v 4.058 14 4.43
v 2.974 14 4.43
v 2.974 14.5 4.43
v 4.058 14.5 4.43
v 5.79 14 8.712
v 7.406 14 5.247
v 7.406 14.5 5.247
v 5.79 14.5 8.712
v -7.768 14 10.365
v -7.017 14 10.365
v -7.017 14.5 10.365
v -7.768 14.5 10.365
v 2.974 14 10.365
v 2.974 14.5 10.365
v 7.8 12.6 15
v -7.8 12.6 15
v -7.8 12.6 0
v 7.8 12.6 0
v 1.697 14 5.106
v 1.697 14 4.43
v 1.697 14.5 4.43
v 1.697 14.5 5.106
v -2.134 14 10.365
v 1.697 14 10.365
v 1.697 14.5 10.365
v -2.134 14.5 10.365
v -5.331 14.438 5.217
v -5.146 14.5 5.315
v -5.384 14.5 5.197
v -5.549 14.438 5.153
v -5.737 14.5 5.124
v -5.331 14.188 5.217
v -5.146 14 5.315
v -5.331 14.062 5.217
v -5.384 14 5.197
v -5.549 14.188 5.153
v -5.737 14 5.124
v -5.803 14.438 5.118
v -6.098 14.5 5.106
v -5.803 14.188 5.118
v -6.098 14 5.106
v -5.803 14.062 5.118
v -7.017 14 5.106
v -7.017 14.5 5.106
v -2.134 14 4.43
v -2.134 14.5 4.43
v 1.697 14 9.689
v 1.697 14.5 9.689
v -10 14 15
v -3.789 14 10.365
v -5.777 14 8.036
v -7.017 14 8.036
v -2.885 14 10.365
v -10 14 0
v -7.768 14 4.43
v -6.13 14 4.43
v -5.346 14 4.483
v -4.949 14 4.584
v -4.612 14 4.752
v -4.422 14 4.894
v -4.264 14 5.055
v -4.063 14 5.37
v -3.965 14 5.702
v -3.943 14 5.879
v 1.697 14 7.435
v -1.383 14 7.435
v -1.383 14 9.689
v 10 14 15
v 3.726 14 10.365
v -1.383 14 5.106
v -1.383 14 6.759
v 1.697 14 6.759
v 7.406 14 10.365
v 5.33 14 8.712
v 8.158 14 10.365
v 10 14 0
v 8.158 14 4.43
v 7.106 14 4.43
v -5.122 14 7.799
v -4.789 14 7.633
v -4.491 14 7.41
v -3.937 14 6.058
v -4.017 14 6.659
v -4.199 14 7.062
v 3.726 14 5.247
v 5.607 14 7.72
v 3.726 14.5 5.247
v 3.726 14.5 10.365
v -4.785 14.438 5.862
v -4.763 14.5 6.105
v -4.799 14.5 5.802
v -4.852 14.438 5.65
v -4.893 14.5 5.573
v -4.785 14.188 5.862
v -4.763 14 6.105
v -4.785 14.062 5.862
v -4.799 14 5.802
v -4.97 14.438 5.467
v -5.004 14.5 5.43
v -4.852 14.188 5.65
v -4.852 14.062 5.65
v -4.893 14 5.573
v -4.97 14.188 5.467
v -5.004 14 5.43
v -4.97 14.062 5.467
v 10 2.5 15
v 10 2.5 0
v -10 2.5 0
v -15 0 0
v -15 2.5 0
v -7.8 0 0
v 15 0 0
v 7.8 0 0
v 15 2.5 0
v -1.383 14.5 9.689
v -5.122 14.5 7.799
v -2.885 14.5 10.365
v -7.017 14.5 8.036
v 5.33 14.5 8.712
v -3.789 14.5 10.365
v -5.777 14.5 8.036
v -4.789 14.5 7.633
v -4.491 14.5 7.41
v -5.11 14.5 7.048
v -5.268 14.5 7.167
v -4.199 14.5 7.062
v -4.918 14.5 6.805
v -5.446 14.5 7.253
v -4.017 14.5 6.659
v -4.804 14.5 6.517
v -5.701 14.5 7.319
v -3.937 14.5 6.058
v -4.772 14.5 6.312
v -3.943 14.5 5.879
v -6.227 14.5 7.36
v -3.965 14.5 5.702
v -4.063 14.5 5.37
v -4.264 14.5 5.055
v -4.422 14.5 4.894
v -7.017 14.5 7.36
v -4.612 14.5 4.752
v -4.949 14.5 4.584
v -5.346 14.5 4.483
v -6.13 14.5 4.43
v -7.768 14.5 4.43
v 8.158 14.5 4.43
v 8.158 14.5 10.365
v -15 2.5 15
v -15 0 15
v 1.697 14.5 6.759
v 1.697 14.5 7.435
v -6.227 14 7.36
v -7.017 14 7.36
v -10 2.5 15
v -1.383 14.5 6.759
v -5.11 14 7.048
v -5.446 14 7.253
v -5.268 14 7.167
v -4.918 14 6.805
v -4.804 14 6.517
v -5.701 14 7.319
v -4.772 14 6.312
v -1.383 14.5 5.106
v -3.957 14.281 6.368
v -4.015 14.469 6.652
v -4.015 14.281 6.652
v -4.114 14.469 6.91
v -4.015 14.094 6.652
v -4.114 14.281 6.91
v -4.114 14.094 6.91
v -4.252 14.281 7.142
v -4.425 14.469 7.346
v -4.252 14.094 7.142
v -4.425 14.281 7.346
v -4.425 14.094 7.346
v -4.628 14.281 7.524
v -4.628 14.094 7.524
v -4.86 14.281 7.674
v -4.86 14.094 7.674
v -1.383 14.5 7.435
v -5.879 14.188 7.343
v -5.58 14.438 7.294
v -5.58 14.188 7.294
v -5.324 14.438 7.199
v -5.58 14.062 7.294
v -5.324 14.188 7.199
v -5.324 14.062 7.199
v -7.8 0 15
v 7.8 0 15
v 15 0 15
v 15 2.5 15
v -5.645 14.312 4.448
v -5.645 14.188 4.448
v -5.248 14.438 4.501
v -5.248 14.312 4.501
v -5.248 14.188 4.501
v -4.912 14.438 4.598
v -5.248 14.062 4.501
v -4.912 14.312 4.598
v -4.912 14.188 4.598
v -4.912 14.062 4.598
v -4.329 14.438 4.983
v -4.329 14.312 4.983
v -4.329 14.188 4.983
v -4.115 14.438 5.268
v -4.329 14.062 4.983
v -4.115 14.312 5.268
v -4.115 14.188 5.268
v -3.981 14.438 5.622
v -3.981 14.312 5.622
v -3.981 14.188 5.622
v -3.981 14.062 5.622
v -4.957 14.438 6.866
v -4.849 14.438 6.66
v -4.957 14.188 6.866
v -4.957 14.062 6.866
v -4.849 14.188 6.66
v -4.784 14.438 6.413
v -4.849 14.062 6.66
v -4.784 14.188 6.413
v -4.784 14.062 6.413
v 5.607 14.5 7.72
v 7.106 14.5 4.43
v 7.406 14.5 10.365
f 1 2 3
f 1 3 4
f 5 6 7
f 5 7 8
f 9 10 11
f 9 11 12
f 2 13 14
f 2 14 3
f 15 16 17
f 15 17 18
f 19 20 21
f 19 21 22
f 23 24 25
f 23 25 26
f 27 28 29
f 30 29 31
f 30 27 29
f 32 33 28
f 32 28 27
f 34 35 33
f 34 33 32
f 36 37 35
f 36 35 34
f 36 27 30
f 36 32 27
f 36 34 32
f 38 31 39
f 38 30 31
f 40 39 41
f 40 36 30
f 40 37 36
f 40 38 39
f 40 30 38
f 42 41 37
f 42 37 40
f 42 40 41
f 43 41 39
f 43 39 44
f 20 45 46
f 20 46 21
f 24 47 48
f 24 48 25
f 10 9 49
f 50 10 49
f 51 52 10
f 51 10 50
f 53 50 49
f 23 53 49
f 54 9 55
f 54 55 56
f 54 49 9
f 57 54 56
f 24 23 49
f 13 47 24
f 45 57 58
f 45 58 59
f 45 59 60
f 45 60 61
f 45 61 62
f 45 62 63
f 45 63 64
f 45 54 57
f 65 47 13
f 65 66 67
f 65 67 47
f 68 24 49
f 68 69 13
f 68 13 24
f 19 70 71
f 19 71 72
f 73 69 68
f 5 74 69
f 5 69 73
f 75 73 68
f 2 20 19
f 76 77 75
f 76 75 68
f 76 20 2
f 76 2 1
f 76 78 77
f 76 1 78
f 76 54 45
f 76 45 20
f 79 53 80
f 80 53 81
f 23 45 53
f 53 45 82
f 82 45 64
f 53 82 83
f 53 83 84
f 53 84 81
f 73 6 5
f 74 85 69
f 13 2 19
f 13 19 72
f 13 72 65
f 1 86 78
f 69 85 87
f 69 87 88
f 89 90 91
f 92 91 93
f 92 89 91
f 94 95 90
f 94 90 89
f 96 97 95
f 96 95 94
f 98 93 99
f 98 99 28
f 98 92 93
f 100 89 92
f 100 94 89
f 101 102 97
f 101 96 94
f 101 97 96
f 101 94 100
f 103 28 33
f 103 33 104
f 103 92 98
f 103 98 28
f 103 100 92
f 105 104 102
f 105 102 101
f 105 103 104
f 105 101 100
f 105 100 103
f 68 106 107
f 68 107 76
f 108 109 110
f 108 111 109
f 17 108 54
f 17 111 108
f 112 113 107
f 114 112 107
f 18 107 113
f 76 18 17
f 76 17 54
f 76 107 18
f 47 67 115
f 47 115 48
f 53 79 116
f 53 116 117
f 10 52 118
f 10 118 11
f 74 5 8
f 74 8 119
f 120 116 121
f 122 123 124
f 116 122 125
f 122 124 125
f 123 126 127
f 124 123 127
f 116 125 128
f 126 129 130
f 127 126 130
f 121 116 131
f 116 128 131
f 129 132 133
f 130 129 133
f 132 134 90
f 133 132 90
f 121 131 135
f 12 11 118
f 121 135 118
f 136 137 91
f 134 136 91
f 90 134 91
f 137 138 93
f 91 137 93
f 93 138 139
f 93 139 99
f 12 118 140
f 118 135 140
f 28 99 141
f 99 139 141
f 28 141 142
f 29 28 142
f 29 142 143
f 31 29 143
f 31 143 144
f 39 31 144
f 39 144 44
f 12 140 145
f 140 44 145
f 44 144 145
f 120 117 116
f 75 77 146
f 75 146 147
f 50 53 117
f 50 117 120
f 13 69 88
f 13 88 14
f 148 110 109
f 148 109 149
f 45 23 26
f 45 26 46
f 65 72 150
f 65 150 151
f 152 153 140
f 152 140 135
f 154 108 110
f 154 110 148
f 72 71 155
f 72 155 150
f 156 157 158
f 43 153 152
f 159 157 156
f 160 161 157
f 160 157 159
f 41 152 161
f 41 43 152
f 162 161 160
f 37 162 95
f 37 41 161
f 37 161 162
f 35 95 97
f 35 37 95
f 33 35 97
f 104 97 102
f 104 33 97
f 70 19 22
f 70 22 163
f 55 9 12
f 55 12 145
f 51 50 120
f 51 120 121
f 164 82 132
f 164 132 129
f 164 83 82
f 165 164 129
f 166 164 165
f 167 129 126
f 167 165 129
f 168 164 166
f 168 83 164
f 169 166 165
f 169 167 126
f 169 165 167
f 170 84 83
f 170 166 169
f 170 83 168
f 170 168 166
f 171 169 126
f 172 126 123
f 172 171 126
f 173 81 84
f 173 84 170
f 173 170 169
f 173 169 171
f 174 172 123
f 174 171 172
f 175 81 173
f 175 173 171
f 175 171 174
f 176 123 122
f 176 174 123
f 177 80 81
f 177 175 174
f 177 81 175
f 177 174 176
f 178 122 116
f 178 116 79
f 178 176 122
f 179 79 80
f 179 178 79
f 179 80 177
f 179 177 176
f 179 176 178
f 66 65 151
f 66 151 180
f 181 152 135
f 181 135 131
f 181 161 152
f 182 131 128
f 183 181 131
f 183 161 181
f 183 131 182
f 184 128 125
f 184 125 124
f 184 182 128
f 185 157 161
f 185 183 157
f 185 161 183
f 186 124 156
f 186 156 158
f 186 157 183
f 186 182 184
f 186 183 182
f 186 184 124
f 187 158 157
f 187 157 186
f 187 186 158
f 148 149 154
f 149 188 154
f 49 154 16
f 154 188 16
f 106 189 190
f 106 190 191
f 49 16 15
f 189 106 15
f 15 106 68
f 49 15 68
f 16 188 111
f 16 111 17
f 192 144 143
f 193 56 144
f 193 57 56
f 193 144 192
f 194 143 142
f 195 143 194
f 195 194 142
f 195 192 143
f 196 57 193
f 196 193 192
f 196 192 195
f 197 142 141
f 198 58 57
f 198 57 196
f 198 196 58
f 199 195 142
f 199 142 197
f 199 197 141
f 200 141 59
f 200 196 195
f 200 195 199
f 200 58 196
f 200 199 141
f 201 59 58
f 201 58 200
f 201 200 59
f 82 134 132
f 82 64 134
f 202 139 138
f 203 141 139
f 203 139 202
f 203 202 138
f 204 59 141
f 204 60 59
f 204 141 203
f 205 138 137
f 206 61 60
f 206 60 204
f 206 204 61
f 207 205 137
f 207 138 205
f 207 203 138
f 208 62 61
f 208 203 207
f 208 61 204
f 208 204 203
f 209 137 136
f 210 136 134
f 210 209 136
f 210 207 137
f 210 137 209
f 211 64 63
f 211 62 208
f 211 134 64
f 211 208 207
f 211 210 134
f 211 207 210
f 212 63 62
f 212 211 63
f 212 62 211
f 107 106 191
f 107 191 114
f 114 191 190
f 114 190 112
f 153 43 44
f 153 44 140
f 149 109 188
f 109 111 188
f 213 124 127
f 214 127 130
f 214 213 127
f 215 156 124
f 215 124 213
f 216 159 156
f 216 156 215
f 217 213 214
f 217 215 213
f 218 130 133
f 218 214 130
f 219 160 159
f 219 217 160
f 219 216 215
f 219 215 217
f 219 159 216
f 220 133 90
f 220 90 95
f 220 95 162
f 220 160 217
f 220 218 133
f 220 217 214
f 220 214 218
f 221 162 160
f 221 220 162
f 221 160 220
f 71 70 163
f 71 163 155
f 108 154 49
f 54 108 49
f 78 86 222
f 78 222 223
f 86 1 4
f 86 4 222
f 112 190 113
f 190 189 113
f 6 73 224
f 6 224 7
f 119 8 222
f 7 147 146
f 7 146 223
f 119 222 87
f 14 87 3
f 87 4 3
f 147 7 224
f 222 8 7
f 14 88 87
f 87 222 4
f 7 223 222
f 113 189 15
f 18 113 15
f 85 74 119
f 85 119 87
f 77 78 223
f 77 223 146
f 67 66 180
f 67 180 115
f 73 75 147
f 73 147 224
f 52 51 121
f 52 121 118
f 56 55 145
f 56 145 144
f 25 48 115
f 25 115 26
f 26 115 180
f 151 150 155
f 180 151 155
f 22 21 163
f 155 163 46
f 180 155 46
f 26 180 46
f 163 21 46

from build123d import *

# Parameters (mm, degrees)
CROQUIS1_W              = 20
CROQUIS1_H              = 14
SALIENTE_EXTRUIR1_DEPTH = 15
CROQUIS2_W              = 15.6
CROQUIS2_H              = 12.6
CORTAR_EXTRUIR1_DEPTH   = 23.825424421
CROQUIS3_W              = 15
CROQUIS3_H              = 2.5
SALIENTE_EXTRUIR2_DEPTH = 5
CROQUIS4_W              = 15
CROQUIS4_H              = 2.5
SALIENTE_EXTRUIR3_DEPTH = 5
SALIENTE_EXTRUIR4_DEPTH = 0.5


with BuildPart() as part:
    # Croquis1 → Saliente-Extruir1 (new body)
    with BuildSketch(Plane.XY):
        with Locations((0, 7)):
            Rectangle(CROQUIS1_W, CROQUIS1_H)
    extrude(amount=SALIENTE_EXTRUIR1_DEPTH)

    # Croquis2 → Cortar-Extruir1 (cut, through all)
    with BuildSketch(Plane.XY.offset(15)):
        with Locations((0, 6.3)):
            Rectangle(CROQUIS2_W, CROQUIS2_H)
    extrude(amount=-CORTAR_EXTRUIR1_DEPTH, mode=Mode.SUBTRACT)

    # Croquis3 → Saliente-Extruir2 (add)
    with BuildSketch(Plane(origin=(10, 0, 0), x_dir=(0, 0, -1), z_dir=(1, 0, 0))):
        with Locations((-7.5, 1.25)):
            Rectangle(CROQUIS3_W, CROQUIS3_H)
    extrude(amount=SALIENTE_EXTRUIR2_DEPTH)

    # Croquis4 → Saliente-Extruir3 (add)
    with BuildSketch(Plane.ZY.offset(10)):
        with Locations((7.5, 1.25)):
            Rectangle(CROQUIS4_W, CROQUIS4_H)
    extrude(amount=SALIENTE_EXTRUIR3_DEPTH)

    # Croquis5 → Saliente-Extruir4 (add)
    # profile 1 of 3: a face of its own
    with BuildSketch(Plane(origin=(0, 14, 0), x_dir=(1, 0, 0), z_dir=(0, 1, 0))):
        with BuildLine():
            Line((-2.88502332, -10.364727743), (-3.788817138, -10.364727743))
            Line((-3.788817138, -10.364727743), (-5.777163537, -8.035991464))
            Line((-5.777163537, -8.035991464), (-7.016652202, -8.035991464))
            Line((-7.016652202, -8.035991464), (-7.016652202, -10.364727743))
            Line((-7.016652202, -10.364727743), (-7.767857453, -10.364727743))
            Line((-7.767857453, -10.364727743), (-7.767857453, -4.430206259))
            Line((-7.767857453, -4.430206259), (-6.130464757, -4.430206259))
            add(Edge.make_bspline(
                [(-6.130464757, -4.430206259), (-6.0459413, -4.431165013), (-5.883831835, -4.433003829), (-5.651888426, -4.445217717), (-5.441974521, -4.467695996), (-5.251420073, -4.497198358), (-5.076320928, -4.540077128), (-4.911710387, -4.595085737), (-4.756352702, -4.665254498), (-4.659629191, -4.7231034), (-4.61162164, -4.751816007)],
                knots=[0, 0, 0, 0, 1.288415781, 2.47108201, 3.538680541, 4.505415573, 5.408010686, 6.28309489, 7.147834801, 8, 8, 8, 8], degree=3))
            add(Edge.make_bspline(
                [(-4.61162164, -4.751816007), (-4.56060529, -4.787000395), (-4.460070052, -4.856336418), (-4.326599875, -4.980440946), (-4.209578564, -5.1165849), (-4.110973827, -5.26783655), (-4.02967085, -5.435680707), (-3.976798666, -5.62564965), (-3.941292298, -5.835036609), (-3.938280358, -5.98174904), (-3.936710672, -6.058208889)],
                knots=[0, 0, 0, 0, 0.963681284, 1.899076006, 2.827943621, 3.752026167, 4.702860247, 5.71857009, 6.811022445, 8, 8, 8, 8], degree=3))
            add(Edge.make_bspline(
                [(-3.936710672, -6.058208889), (-3.93745934, -6.111069878), (-3.93892671, -6.214676048), (-3.954968911, -6.366794009), (-3.979251178, -6.512331235), (-4.01310717, -6.651852236), (-4.05794689, -6.784371061), (-4.111642187, -6.910836248), (-4.176966463, -7.029766654), (-4.250819351, -7.142352152), (-4.333124618, -7.248469966), (-4.424228497, -7.346918297), (-4.521492422, -7.440360452), (-4.627505642, -7.525742064), (-4.740372634, -7.604737188), (-4.860837683, -7.676024782), (-4.98763716, -7.742797298), (-5.076899105, -7.780006005), (-5.122206459, -7.798892307)],
                knots=[0, 0, 0, 0, 1.126128489, 2.207182719, 3.255820935, 4.268986334, 5.263032379, 6.234153775, 7.193063852, 8.150486488, 9.10116855, 10.051301984, 11.006725633, 11.972966631, 12.949086479, 13.94005042, 14.954415947, 16, 16, 16, 16], degree=3))
            Line((-5.122206459, -7.798892307), (-2.88502332, -10.364727743))
        make_face()
        with BuildLine():
            add(Edge.make_bspline(
                [(-4.763036448, -6.105159217), (-4.76425827, -6.063643734), (-4.766654107, -5.982237185), (-4.782538048, -5.863974915), (-4.811639256, -5.753311079), (-4.849434013, -5.64927727), (-4.902032931, -5.552802913), (-4.968287593, -5.463820517), (-5.050018411, -5.383249363), (-5.113312501, -5.338238747), (-5.145681623, -5.315219945)],
                knots=[0, 0, 0, 0, 1.085368415, 2.128268547, 3.1106313, 4.071895604, 5.014699805, 5.972038339, 6.962883605, 8, 8, 8, 8], degree=3))
            add(Edge.make_bspline(
                [(-5.145681623, -5.315219945), (-5.175015585, -5.296501747), (-5.234192037, -5.258740856), (-5.332300766, -5.214393463), (-5.437527778, -5.177833986), (-5.551527993, -5.151906272), (-5.67362264, -5.129845566), (-5.805927755, -5.117301749), (-5.948364796, -5.106770759), (-6.046712907, -5.10645458), (-6.097599527, -5.106290985)],
                knots=[0, 0, 0, 0, 0.843459406, 1.701540853, 2.6053125, 3.542575708, 4.535326681, 5.614234208, 6.765573065, 8, 8, 8, 8], degree=3))
            Line((-6.097599527, -5.106290985), (-7.016652202, -5.106290985))
            Line((-7.016652202, -5.106290985), (-7.016652202, -7.359906738))
            Line((-7.016652202, -7.359906738), (-6.22671293, -7.359906738))
            add(Edge.make_bspline(
                [(-6.22671293, -7.359906738), (-6.166842369, -7.358806598), (-6.050896861, -7.356676062), (-5.882983115, -7.346006667), (-5.727291264, -7.323687715), (-5.581932855, -7.297806333), (-5.447903419, -7.255709311), (-5.323535107, -7.202662948), (-5.210703341, -7.132400077), (-5.143863862, -7.075910781), (-5.110468877, -7.047687056)],
                knots=[0, 0, 0, 0, 1.210655428, 2.344558938, 3.398352313, 4.389640028, 5.325372474, 6.232137918, 7.116723723, 8, 8, 8, 8], degree=3))
            add(Edge.make_bspline(
                [(-5.110468877, -7.047687056), (-5.081919706, -7.019018524), (-5.025727055, -6.962590938), (-4.955449604, -6.866968879), (-4.894853881, -6.767164245), (-4.845837842, -6.659290565), (-4.807837038, -6.540844414), (-4.781139775, -6.408636819), (-4.766726062, -6.261588504), (-4.764301436, -6.158791145), (-4.763036448, -6.105159217)],
                knots=[0, 0, 0, 0, 0.936271895, 1.842841591, 2.741489519, 3.638077323, 4.58130199, 5.617848582, 6.75717263, 8, 8, 8, 8], degree=3))
        make_face(mode=Mode.SUBTRACT)
    # profile 2 of 3: a face of its own
    with BuildSketch(Plane(origin=(0, 14, 0), x_dir=(1, 0, 0), z_dir=(0, 1, 0))):
        Polygon((1.697328712, -10.364727743), (-2.133818069, -10.364727743), (-2.133818069, -4.430206259), (1.697328712, -4.430206259), (1.697328712, -5.106290985), (-1.382612818, -5.106290985), (-1.382612818, -6.758942537), (1.697328712, -6.758942537), (1.697328712, -7.435027264), (-1.382612818, -7.435027264), (-1.382612818, -9.688643017), (1.697328712, -9.688643017), align=None)
    # profile 3 of 3: a face of its own
    with BuildSketch(Plane(origin=(0, 14, 0), x_dir=(1, 0, 0), z_dir=(0, 1, 0))):
        Polygon((8.157693872, -10.364727743), (7.406488621, -10.364727743), (7.406488621, -5.247141969), (5.790223573, -8.712076191), (5.330110356, -8.712076191), (3.72558289, -5.247141969), (3.72558289, -10.364727743), (2.974377639, -10.364727743), (2.974377639, -4.430206259), (4.057756462, -4.430206259), (5.607117293, -7.720250507), (7.10600652, -4.430206259), (8.157693872, -4.430206259), align=None)
    extrude(amount=SALIENTE_EXTRUIR4_DEPTH)


solid = part.part
